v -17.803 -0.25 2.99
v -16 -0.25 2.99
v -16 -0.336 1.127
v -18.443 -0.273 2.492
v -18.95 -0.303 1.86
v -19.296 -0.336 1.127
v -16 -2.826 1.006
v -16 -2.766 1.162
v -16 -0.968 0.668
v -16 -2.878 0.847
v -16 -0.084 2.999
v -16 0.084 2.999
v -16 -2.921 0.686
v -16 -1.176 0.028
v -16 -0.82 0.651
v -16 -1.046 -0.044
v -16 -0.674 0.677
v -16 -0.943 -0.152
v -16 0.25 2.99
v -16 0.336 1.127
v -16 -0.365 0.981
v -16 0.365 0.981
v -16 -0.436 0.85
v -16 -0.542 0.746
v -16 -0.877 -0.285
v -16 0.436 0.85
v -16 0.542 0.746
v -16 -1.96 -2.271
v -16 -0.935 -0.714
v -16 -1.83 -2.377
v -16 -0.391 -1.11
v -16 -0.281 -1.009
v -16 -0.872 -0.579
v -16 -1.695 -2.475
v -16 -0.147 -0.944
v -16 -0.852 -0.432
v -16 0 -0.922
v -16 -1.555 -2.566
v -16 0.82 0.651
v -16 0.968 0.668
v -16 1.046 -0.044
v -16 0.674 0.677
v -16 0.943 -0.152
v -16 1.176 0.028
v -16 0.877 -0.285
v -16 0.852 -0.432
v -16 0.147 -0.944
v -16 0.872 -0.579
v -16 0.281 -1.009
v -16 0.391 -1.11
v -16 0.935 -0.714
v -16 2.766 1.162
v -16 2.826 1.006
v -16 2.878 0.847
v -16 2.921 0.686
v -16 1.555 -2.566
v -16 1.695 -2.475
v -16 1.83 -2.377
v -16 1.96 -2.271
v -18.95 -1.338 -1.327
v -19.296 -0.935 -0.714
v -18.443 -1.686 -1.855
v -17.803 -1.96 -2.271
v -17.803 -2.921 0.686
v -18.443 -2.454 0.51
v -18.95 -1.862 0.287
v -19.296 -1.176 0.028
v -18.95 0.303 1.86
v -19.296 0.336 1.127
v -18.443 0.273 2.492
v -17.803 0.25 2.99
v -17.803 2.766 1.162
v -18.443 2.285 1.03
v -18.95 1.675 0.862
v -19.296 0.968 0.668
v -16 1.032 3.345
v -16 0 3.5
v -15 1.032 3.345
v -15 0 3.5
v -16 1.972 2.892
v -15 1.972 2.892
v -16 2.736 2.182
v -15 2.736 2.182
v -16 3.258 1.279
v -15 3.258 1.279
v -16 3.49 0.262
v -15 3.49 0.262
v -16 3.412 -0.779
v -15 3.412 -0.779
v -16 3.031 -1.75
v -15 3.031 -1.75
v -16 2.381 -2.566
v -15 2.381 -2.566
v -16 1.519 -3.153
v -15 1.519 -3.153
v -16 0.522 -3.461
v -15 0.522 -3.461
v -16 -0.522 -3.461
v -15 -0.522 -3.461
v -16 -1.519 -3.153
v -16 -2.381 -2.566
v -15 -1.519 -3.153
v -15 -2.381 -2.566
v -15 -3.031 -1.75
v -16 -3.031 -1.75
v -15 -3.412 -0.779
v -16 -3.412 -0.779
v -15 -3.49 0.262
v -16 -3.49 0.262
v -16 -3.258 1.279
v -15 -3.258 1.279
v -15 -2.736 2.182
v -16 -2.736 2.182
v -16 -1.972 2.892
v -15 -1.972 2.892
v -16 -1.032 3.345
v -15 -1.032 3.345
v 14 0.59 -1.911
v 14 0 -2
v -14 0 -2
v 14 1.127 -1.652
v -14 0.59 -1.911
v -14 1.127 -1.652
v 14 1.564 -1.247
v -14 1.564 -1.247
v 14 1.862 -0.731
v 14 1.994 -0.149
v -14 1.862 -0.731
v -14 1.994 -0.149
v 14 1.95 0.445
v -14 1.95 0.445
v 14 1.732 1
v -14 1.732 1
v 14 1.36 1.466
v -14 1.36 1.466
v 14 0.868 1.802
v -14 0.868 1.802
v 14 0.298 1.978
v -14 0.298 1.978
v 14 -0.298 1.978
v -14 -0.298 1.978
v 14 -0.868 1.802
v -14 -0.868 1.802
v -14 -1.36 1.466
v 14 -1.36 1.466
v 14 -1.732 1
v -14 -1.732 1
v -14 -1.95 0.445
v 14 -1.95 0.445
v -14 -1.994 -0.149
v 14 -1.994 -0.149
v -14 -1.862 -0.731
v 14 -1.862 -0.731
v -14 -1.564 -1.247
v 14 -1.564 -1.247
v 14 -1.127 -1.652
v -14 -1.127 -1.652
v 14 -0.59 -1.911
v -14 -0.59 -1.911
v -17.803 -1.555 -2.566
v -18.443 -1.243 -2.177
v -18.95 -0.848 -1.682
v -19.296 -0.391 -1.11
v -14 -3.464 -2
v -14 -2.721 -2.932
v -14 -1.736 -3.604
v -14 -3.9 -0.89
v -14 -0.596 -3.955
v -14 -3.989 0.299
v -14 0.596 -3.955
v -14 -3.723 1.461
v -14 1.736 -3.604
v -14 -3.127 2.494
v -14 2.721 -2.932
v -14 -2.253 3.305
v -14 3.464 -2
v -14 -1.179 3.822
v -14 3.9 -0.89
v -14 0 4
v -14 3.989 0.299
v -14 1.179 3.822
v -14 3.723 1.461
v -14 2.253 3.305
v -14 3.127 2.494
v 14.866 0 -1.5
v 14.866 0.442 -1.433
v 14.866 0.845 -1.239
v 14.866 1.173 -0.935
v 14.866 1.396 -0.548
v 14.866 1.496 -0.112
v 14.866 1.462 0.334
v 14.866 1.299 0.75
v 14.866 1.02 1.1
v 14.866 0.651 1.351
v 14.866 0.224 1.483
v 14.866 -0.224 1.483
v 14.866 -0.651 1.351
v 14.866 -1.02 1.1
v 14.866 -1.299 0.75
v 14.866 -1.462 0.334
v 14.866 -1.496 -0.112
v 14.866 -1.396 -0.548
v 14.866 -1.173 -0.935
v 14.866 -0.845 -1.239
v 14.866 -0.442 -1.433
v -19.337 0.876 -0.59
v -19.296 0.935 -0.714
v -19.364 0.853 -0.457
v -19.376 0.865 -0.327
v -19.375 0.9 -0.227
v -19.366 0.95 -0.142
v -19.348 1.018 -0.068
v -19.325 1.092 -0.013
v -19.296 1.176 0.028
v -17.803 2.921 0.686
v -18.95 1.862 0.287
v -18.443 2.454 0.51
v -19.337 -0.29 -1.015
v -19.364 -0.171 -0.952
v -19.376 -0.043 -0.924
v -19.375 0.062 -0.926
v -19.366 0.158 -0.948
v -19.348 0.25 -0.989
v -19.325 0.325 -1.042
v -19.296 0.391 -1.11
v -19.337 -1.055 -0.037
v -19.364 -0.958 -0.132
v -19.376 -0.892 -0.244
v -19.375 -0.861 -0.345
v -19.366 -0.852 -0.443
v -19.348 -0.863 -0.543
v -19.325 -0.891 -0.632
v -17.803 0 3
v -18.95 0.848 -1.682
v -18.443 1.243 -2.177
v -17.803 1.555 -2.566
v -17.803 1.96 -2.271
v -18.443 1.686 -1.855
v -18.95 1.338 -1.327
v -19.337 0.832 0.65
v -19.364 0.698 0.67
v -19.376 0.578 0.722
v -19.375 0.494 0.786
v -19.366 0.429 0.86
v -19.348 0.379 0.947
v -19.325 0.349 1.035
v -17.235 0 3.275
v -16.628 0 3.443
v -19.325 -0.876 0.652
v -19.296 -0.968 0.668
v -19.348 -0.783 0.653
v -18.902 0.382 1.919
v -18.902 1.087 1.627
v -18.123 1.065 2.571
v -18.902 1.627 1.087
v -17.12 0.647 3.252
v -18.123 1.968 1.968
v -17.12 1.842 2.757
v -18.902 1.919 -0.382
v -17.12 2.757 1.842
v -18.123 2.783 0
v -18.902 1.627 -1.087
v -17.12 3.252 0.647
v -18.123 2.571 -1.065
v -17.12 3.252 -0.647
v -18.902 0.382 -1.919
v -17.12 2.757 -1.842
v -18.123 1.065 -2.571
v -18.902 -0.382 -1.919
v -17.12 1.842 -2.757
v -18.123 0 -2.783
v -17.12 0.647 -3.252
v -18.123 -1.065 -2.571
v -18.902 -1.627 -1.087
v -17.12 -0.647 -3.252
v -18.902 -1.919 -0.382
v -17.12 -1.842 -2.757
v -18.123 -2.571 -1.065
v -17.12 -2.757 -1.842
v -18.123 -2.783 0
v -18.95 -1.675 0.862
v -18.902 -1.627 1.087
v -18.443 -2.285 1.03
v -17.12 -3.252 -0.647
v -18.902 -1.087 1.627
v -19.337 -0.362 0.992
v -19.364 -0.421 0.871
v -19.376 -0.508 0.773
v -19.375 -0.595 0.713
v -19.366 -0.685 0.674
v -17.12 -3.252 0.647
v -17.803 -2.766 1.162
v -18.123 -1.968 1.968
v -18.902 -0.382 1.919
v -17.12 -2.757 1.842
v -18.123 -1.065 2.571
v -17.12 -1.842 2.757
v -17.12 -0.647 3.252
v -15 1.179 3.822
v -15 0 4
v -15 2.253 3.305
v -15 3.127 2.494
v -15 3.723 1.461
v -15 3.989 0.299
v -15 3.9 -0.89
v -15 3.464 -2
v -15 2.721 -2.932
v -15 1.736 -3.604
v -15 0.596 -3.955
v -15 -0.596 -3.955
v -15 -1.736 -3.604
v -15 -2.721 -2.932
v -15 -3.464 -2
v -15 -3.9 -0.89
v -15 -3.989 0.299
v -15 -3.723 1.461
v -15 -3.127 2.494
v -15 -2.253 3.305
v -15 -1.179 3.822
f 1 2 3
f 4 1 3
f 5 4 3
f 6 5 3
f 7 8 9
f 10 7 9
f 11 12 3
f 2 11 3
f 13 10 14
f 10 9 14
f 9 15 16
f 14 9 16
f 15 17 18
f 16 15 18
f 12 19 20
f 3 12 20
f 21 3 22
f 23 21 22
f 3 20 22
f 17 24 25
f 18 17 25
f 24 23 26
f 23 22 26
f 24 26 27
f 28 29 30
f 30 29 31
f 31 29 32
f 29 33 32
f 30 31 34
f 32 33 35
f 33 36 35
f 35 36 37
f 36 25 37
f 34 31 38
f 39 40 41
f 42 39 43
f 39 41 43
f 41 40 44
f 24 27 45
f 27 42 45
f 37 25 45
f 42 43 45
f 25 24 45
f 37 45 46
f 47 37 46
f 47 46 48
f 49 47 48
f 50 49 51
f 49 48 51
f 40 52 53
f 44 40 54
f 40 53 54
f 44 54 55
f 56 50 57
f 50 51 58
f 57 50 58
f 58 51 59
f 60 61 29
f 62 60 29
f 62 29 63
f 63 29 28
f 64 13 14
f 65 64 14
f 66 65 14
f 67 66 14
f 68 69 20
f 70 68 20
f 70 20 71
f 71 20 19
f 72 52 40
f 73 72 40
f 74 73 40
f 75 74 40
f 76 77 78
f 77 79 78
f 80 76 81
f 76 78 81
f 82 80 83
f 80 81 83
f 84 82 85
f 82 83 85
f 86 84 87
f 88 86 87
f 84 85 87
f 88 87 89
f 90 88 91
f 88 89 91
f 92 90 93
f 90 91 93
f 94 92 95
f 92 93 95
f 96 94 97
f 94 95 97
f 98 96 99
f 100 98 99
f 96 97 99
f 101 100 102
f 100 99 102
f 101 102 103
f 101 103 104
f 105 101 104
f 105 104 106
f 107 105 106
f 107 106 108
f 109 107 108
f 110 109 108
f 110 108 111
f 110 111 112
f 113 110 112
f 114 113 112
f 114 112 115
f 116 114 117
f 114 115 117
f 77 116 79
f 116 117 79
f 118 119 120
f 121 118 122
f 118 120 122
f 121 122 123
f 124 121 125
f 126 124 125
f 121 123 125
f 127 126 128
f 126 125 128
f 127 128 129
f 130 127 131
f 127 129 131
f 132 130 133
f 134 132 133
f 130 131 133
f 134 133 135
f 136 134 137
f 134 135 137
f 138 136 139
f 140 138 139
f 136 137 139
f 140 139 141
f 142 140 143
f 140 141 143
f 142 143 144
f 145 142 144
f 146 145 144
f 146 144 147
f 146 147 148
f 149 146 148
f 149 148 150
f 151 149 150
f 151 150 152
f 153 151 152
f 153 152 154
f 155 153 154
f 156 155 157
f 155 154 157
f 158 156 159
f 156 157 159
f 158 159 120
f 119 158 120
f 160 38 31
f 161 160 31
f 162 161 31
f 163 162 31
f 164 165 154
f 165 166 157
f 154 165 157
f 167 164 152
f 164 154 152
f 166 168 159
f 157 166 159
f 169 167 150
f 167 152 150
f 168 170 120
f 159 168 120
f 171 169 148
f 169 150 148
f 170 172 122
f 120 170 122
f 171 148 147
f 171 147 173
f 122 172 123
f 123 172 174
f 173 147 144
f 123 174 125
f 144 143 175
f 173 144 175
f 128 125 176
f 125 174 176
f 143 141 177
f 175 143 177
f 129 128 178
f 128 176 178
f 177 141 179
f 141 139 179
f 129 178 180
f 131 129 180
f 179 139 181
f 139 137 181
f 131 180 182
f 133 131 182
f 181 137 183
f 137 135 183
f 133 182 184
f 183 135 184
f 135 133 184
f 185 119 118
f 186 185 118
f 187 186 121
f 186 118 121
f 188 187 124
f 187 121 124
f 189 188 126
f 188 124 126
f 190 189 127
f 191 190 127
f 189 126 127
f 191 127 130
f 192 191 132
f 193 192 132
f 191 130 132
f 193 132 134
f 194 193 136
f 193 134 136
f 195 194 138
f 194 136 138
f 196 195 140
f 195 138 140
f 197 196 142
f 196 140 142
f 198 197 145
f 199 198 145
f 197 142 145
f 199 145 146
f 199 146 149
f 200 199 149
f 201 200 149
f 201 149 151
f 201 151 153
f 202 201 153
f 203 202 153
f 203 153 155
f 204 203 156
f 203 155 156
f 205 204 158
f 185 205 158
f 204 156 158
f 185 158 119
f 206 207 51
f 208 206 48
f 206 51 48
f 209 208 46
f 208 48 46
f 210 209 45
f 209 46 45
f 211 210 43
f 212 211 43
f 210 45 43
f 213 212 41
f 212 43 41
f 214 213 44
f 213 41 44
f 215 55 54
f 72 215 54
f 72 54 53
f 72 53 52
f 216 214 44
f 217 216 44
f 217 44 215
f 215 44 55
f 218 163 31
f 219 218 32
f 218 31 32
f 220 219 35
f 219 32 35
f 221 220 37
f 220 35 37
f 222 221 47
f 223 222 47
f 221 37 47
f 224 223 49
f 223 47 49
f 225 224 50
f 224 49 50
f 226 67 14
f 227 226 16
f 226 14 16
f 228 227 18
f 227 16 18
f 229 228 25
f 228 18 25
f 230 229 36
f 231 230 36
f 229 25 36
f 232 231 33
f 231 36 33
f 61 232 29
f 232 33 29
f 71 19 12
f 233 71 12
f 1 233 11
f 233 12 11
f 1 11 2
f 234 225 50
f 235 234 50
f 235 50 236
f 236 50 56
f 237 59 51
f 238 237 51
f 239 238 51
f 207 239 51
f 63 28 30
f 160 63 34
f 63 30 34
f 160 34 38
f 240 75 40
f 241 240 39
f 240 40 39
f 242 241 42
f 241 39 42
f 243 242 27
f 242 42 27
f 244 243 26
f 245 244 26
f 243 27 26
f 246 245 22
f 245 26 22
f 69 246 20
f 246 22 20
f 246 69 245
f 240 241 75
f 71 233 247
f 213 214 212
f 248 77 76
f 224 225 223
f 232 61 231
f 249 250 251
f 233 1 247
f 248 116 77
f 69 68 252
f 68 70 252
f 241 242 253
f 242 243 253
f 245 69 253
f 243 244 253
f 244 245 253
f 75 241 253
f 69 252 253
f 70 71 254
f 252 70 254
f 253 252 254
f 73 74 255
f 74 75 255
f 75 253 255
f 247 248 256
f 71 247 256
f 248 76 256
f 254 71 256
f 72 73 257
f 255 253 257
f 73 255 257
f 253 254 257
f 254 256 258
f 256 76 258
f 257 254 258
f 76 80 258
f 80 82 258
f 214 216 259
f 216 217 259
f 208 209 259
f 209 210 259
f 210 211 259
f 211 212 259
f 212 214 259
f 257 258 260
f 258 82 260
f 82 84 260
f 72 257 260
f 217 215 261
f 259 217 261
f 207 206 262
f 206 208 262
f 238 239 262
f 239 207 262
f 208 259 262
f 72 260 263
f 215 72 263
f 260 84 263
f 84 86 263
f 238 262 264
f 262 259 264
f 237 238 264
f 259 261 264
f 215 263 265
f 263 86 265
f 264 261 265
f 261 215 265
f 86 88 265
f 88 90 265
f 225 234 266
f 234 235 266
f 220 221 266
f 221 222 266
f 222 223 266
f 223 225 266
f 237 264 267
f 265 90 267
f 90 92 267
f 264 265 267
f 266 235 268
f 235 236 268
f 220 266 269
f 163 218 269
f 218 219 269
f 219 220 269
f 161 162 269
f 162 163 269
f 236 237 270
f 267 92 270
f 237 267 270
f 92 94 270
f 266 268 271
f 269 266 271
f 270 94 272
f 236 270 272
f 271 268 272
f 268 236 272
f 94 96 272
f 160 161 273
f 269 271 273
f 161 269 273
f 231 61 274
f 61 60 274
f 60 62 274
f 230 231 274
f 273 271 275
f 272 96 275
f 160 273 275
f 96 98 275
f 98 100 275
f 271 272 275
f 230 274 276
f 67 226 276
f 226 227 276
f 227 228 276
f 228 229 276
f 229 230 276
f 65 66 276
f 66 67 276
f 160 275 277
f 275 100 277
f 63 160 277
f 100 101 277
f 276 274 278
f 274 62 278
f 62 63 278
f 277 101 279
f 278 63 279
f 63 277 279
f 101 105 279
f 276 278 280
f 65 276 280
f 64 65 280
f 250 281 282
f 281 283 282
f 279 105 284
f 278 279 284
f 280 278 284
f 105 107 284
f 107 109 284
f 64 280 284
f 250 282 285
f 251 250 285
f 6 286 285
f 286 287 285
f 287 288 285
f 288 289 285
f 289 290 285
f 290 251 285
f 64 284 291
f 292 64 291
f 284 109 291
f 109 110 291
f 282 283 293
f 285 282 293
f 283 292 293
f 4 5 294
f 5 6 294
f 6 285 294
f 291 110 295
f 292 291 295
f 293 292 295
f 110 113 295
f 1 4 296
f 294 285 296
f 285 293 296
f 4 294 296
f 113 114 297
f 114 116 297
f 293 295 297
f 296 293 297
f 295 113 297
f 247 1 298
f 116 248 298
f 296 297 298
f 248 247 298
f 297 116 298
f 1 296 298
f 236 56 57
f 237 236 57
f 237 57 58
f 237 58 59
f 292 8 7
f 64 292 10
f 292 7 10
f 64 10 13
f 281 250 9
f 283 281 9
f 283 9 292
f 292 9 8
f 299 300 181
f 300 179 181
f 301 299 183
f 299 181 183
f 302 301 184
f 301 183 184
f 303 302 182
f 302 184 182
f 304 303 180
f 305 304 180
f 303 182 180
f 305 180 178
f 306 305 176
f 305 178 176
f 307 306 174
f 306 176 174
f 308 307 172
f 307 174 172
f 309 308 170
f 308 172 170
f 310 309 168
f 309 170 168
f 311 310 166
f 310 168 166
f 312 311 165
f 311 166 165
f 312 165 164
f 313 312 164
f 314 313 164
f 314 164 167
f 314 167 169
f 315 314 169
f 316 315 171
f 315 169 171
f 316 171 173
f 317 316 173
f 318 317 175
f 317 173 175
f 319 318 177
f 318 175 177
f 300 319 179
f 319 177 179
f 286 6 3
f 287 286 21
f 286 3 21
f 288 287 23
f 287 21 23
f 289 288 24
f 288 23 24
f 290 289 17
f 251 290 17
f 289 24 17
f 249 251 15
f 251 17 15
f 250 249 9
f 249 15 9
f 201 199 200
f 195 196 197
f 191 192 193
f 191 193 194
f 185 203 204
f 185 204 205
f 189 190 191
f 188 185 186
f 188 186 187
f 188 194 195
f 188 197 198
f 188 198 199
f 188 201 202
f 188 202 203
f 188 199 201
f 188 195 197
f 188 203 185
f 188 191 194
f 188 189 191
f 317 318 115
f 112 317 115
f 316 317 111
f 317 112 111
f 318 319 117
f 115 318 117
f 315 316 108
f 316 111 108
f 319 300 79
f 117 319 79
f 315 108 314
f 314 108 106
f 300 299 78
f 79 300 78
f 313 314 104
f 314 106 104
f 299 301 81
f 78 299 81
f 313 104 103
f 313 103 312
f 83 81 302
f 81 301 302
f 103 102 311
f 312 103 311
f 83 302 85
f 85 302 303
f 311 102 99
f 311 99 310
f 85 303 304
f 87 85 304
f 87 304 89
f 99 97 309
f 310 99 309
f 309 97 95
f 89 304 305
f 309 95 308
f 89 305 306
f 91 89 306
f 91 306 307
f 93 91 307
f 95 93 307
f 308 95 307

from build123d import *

# Parameters (mm, degrees)
SKETCH2_R               = 2
BOSS_EXTRUDE1_DEPTH     = 28.866025404
CUT_EXTRUDE1_REACH      = 33.38
CUT_EXTRUDE1_END_RADIUS = 3.5
CHAMFER1_SIZE           = 0.5
CHAMFER1_SIZE2          = 0.866025404
FILLET1_R               = 0.5


with BuildPart() as part:
    # Sketch1 → Revolve1 (revolve)
    with BuildSketch(Plane(origin=(0, 0, 0), x_dir=(-1, 0, 0), z_dir=(0, 0, -1)), mode=Mode.PRIVATE) as revolve1_sk:
        with BuildLine():
            Line((14, 4), (14, 0))
            Line((14, 0), (19.5, 0))
            ThreePointArc((19.5, 0), (18.474873734, 2.474873734), (16, 3.5))
            Line((16, 3.5), (15, 3.5))
            Line((15, 3.5), (15, 4))
            Line((15, 4), (14, 4))
        make_face()
    revolve(revolve1_sk.sketch.rotate(Axis((-14, 0, 0), (-1, 0, 0)), 270), axis=Axis((-14, 0, 0), (-1, 0, 0)))

    # Sketch2 → Boss-Extrude1 (add)
    with BuildSketch(Plane(origin=(-14, 0, 0), x_dir=(0, 0, -1), z_dir=(1, 0, 0))):
        Circle(SKETCH2_R)
    extrude(amount=BOSS_EXTRUDE1_DEPTH)

    # Cut-Extrude1: up to this sphere (the profile starts inside it)
    cut_extrude1_end = Location((-16, 0, 0)) * Sphere(CUT_EXTRUDE1_END_RADIUS, mode=Mode.PRIVATE)
    # Sketch3 → Cut-Extrude1 (cut, up to the surface)
    with BuildSketch(Plane(origin=(-16, 0, 0), x_dir=(0, 0, -1), z_dir=(1, 0, 0)), mode=Mode.PRIVATE) as cut_extrude1_sk1:
        with BuildLine():
            Line((2.271345978, 1.959843731), (0.191997374, 0.590907157))
            Line((0.191997374, 0.590907157), (-0.685590254, 2.920610553))
            ThreePointArc((-0.685590254, 2.920610553), (-0.927050983, 2.853169549), (-1.162037644, 2.765803412))
            Line((-1.162037644, 2.765803412), (-0.502655651, 0.365200707))
            Line((-0.502655651, 0.365200707), (-2.989524738, 0.250483216))
            ThreePointArc((-2.989524738, 0.250483216), (-3, 0), (-2.989524738, -0.250483216))
            Line((-2.989524738, -0.250483216), (-0.502655651, -0.365200707))
            Line((-0.502655651, -0.365200707), (-1.162037644, -2.765803412))
            ThreePointArc((-1.162037644, -2.765803412), (-0.927050983, -2.853169549), (-0.685590254, -2.920610553))
            Line((-0.685590254, -2.920610553), (0.191997374, -0.590907157))
            Line((0.191997374, -0.590907157), (2.271345978, -1.959843731))
            ThreePointArc((2.271345978, -1.959843731), (2.427050983, -1.763355757), (2.565806659, -1.554553373))
            Line((2.565806659, -1.554553373), (0.621316554, 0))
            Line((0.621316554, 0), (2.565806659, 1.554553373))
            ThreePointArc((2.565806659, 1.554553373), (2.427050983, 1.763355757), (2.271345978, 1.959843731))
        make_face()
    cut_extrude1_tool1 = extrude(cut_extrude1_sk1.sketch, amount=-CUT_EXTRUDE1_REACH, mode=Mode.PRIVATE) & cut_extrude1_end
    add(cut_extrude1_tool1.solids().sort_by_distance((-16, 0, 0))[0], mode=Mode.SUBTRACT)

    # Chamfer1
    chamfer1_edges = [part.edges().sort_by_distance(p)[0] for p in [
        (14.866025404, 0, 2),
    ]]
    chamfer1_side = [part.faces().sort_by_distance(p)[0] for p in [
        (14.866025404, 0, 0),
    ]]
    chamfer(chamfer1_edges, length=CHAMFER1_SIZE, length2=CHAMFER1_SIZE2, reference=chamfer1_side[0])

    # Fillet1
    # the kernel refuses this fillet: 0.5 mm, written as the material it takes off along each edge
    with BuildSketch(Plane(origin=(-16, 0, -0.621316554), x_dir=(0, -0.6244406033134772, -0.7810722968672622), z_dir=(-1, 0, 0)), Plane(origin=(-16, -0.590907157, -0.191997374), x_dir=(0, -0.9358066560348443, 0.35251369125309573), z_dir=(-1, 0, 0)), Plane(origin=(-16, -0.365200707, 0.502655651), x_dir=(0, 0.04608028298555685, 0.9989377395613659), z_dir=(-1, 0, 0)), Plane(origin=(-16, 0.365200707, 0.502655651), x_dir=(0, 0.964285837131132, 0.2648637844408172), z_dir=(-1, 0, 0)), Plane(origin=(-16, 0.590907157, -0.191997374), x_dir=(0, 0.5498811392316572, -0.8352429183879951), z_dir=(-1, 0, 0))) as fillet1_piece_1:
        with BuildLine():
            CenterArc((FILLET1_R * 1.25083521591, -FILLET1_R), FILLET1_R, 90, 102.717718013)
            Line((FILLET1_R * 0.275368703333, -FILLET1_R * 1.22014786587), (0, 0))
            Line((0, 0), (FILLET1_R * 1.25083521591, 0))
        make_face()
    extrude(amount=5.007954817, mode=Mode.SUBTRACT)


solid = part.part
